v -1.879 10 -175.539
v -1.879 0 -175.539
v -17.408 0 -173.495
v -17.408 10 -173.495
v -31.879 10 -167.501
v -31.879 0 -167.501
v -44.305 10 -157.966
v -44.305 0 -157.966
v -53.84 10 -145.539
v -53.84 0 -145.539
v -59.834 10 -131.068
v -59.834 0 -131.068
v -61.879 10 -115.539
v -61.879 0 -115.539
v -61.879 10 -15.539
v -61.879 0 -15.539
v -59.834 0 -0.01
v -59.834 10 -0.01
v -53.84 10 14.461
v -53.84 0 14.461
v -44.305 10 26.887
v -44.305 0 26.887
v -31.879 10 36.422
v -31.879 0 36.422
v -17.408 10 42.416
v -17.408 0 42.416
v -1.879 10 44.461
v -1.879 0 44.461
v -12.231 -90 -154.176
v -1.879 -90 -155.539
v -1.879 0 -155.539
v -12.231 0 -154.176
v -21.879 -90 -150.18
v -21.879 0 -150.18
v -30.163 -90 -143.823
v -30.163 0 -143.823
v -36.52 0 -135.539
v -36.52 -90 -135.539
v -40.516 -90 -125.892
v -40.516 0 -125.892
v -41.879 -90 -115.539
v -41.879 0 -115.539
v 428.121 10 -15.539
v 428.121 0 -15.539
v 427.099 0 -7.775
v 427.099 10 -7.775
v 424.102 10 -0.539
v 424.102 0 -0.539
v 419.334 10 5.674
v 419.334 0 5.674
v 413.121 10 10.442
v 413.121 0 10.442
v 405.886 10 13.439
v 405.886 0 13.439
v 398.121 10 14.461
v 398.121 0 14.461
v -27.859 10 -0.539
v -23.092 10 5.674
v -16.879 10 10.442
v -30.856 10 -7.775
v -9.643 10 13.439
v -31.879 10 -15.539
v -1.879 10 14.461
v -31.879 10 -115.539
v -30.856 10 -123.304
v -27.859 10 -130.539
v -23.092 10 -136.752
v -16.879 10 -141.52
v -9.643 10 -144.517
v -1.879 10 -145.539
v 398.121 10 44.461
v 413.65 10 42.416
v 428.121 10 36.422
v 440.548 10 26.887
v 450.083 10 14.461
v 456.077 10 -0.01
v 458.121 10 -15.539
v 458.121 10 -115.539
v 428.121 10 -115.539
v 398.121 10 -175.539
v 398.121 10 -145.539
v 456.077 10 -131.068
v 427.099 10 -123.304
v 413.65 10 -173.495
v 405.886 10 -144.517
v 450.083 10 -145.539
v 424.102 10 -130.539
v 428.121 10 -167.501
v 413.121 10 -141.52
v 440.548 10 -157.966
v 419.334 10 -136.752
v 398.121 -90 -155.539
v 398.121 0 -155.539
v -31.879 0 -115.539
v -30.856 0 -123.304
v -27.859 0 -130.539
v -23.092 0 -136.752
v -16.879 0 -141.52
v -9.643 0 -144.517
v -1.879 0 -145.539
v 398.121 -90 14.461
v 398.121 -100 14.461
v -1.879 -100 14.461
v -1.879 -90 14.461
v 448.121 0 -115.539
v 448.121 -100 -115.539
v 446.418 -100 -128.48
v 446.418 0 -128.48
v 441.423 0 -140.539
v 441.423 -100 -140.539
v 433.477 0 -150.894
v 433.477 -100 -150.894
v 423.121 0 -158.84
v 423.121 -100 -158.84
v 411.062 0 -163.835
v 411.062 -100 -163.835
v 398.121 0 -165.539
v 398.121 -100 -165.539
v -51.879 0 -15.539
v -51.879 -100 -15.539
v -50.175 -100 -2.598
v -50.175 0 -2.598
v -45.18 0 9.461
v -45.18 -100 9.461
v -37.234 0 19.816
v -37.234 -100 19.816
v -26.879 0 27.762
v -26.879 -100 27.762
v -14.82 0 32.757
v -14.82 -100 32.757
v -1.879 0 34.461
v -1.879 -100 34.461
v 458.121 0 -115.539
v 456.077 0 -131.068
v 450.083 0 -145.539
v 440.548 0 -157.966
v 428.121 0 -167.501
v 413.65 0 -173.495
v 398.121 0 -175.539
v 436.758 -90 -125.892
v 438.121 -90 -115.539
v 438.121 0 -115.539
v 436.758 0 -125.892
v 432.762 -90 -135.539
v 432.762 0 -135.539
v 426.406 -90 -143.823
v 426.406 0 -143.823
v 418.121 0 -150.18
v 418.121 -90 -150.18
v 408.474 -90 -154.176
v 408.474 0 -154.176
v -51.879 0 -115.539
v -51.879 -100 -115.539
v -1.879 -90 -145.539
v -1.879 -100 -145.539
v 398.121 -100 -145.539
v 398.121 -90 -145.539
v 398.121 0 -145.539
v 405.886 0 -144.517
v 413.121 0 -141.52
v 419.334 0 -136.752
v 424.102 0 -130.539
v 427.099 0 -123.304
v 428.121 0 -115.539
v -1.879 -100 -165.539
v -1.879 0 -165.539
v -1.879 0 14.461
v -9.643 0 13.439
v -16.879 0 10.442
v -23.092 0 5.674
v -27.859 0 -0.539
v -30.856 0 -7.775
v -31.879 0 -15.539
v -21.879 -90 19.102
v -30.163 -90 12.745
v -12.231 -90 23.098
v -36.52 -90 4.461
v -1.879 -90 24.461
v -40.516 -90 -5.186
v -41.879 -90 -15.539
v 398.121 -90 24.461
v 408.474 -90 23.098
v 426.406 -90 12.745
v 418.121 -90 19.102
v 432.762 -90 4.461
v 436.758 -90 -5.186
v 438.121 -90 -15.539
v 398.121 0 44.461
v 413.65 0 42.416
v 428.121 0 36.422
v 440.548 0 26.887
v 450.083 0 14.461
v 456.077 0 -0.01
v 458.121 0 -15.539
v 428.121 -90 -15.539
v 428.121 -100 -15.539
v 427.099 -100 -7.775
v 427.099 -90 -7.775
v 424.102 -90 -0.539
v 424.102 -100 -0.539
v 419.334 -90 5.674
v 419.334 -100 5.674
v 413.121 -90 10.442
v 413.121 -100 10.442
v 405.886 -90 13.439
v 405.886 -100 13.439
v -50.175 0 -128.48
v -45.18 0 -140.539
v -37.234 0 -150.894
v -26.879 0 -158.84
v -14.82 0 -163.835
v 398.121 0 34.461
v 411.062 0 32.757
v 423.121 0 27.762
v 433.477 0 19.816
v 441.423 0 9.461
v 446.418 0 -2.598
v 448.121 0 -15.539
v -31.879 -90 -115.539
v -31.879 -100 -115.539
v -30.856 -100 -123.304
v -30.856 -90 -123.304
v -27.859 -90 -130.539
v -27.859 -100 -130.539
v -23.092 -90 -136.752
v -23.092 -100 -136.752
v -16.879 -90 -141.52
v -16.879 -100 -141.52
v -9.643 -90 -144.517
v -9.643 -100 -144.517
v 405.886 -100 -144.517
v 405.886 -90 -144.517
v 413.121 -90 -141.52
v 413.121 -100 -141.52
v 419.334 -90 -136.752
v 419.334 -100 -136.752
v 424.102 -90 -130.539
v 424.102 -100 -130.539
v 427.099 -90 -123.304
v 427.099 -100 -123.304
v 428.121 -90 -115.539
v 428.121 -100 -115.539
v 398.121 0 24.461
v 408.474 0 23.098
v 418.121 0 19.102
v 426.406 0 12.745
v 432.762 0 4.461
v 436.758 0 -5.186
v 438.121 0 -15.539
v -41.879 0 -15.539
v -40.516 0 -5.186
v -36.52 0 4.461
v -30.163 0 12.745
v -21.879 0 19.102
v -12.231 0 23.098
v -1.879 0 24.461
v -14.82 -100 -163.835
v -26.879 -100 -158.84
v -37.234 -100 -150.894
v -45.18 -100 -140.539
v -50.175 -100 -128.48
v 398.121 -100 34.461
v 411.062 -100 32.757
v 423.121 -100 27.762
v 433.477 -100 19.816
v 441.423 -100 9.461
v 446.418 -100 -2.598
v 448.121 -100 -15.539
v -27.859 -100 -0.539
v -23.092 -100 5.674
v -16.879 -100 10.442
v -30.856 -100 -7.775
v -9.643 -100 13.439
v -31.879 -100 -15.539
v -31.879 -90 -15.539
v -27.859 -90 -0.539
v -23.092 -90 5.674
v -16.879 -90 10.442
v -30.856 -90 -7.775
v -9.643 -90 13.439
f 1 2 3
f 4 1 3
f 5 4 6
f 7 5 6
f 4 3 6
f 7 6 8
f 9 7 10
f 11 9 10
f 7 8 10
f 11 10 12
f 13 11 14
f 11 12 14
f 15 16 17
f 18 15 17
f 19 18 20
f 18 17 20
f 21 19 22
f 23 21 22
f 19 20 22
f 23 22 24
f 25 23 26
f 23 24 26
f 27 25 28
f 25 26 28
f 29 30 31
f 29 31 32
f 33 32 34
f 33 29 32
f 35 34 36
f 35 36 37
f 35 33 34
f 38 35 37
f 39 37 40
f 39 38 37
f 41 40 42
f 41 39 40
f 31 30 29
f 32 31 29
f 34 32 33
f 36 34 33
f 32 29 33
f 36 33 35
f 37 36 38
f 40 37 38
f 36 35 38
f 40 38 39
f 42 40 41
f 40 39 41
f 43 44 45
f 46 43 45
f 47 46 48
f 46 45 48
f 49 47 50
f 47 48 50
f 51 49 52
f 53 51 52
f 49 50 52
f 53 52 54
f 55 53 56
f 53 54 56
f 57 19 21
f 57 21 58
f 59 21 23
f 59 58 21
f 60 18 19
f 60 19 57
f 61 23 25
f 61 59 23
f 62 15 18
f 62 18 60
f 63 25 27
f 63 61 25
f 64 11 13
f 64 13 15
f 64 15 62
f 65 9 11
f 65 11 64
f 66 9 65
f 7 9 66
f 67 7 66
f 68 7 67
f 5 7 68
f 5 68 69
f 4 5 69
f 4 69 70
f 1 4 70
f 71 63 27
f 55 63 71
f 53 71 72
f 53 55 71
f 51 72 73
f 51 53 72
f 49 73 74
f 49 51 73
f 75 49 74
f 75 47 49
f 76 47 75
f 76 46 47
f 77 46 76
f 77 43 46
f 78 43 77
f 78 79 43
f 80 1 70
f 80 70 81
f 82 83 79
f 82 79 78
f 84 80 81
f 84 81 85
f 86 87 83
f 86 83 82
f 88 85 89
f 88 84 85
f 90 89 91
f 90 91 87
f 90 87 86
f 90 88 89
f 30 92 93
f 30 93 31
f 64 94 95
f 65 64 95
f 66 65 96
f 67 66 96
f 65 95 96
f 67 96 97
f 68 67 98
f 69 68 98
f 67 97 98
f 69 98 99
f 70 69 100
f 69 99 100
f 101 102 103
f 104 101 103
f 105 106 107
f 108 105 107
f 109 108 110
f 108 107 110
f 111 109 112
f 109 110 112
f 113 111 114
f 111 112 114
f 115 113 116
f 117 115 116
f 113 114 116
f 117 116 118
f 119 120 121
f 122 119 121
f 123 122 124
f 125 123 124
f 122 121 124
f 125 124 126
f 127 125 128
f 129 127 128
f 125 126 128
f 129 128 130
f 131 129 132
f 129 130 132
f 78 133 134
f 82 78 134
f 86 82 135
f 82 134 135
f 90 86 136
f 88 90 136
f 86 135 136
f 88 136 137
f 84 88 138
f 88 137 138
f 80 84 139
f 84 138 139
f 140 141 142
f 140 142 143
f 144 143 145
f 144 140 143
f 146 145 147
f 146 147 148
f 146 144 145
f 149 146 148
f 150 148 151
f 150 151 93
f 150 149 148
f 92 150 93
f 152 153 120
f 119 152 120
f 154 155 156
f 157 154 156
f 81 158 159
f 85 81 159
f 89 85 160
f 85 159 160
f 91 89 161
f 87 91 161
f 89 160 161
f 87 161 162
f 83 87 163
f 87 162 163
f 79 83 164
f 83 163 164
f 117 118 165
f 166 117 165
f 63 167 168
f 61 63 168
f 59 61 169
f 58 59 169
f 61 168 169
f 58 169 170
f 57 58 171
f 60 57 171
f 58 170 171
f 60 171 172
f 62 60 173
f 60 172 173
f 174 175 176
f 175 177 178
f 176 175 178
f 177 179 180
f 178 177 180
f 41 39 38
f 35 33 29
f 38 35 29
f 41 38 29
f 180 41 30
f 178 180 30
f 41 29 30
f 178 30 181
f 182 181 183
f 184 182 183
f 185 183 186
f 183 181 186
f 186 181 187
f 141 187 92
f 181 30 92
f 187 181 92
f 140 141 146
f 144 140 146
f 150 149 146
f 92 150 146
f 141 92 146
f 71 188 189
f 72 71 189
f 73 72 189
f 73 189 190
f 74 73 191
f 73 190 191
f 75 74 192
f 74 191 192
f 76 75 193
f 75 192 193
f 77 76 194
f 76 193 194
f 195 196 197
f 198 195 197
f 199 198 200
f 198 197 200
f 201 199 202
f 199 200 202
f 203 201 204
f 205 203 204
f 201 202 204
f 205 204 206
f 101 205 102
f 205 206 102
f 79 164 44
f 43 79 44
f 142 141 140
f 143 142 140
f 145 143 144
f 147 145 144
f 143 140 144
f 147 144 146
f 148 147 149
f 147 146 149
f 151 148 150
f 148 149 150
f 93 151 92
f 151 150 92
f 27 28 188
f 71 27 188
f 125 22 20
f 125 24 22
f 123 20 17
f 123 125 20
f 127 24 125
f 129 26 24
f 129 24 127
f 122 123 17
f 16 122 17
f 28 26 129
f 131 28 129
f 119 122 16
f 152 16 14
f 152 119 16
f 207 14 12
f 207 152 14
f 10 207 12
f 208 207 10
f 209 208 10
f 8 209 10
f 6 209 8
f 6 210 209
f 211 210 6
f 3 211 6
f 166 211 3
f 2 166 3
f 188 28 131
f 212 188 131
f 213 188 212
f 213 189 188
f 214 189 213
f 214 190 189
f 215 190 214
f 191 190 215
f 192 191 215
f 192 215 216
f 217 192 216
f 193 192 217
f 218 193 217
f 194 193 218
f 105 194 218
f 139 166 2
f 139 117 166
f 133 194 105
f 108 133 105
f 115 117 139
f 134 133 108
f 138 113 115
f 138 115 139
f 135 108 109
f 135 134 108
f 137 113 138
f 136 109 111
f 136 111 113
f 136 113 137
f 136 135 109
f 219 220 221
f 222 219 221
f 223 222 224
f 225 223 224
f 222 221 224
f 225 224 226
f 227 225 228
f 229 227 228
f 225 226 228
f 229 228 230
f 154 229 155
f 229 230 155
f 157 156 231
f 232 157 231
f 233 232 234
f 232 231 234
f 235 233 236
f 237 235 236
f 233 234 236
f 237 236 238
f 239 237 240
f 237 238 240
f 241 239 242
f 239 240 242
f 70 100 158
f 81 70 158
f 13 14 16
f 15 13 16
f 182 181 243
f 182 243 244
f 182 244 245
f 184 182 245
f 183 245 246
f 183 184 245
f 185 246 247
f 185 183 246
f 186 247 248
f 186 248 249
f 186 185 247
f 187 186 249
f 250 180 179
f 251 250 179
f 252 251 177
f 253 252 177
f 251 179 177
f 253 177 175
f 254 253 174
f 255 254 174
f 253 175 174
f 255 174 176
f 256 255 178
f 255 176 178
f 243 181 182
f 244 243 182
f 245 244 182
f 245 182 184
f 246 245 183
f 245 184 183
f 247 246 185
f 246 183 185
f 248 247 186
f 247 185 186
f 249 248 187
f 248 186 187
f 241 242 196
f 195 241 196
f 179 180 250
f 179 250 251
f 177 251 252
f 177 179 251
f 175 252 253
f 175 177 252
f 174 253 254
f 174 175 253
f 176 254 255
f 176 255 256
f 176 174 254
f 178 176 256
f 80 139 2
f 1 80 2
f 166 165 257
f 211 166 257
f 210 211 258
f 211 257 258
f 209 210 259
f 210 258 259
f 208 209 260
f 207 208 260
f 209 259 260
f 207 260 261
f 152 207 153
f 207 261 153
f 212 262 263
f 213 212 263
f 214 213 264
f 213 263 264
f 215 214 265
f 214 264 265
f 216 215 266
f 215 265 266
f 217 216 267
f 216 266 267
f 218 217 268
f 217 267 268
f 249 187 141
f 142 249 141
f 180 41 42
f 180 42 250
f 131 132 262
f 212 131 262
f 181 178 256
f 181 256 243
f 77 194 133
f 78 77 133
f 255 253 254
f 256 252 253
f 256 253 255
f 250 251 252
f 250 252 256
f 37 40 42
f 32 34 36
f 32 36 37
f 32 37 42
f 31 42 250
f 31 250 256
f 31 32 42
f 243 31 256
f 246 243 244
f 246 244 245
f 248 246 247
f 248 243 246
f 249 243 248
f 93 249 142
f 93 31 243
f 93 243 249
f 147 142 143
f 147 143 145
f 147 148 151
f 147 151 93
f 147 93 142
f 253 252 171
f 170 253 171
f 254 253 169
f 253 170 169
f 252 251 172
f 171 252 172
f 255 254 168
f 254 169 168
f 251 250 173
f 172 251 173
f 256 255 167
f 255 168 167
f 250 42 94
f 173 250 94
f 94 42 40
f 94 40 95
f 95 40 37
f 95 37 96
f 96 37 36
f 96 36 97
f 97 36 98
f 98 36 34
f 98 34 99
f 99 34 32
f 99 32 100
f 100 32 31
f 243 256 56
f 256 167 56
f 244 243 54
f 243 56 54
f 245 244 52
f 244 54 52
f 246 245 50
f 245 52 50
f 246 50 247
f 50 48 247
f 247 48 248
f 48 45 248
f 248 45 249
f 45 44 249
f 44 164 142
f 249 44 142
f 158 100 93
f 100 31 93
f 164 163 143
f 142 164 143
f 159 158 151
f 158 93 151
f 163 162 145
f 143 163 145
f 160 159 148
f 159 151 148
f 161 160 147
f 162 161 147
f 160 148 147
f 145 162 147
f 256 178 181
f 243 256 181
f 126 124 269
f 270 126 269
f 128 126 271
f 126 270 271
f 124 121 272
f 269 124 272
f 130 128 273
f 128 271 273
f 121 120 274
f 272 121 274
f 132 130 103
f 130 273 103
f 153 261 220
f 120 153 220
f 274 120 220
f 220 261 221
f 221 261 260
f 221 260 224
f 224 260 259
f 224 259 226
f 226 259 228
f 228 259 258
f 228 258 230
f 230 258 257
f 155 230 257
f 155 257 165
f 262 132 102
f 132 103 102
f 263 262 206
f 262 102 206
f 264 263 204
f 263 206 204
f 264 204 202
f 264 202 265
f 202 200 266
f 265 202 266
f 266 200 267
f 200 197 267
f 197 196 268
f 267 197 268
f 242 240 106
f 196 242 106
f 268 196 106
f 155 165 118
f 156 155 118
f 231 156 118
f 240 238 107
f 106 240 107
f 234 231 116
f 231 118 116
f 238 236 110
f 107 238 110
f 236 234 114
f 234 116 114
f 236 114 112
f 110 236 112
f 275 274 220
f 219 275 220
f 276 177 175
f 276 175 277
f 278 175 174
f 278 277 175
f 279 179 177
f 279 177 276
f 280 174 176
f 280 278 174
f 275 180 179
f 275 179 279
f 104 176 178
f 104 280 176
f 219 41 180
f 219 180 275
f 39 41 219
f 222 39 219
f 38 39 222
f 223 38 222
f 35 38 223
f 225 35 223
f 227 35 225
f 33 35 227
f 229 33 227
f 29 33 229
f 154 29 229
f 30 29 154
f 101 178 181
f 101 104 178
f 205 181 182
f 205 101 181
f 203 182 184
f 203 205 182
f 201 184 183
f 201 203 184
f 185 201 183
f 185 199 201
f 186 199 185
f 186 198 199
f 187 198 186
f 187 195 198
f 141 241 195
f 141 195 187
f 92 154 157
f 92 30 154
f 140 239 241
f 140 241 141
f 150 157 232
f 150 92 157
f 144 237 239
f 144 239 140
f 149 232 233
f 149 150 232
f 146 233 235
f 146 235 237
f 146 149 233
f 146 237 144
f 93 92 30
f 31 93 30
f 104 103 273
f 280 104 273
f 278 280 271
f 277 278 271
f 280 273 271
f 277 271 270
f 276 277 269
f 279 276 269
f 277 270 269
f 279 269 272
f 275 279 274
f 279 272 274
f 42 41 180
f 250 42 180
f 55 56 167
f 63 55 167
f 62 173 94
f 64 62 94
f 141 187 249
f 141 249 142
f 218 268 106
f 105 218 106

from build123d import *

# Parameters (mm, degrees)
SURFACE_EXTRUDE1_1_BACK  = 100
SURFACE_EXTRUDE1_1_DEPTH = 100
THICKEN1_T1              = 10
SURFACE_EXTRUDE2_2_DEPTH = 10
THICKEN2_T1              = 10
THICKEN2_T2              = 10
THICKEN3_START           = -100
THICKEN3_DEPTH           = 10
THICKEN4_DEPTH           = 10
THICKEN5_START           = -90
THICKEN5_DEPTH           = 90


# Read off the part's stored shape, not the designer's step: Thicken3, Thicken4, Thicken5
with BuildPart() as body_1:
    # Surface-Extrude1: a surface, the sketch's curves swept straight by 100 mm
    with BuildLine(Plane(origin=(0, 0, 0), x_dir=(1, 0, 0), z_dir=(0, 1, 0)).offset(-SURFACE_EXTRUDE1_1_BACK), mode=Mode.PRIVATE) as surface_extrude1_1_path:
        Line((-1.878720563, -34.460865773), (398.121279437, -34.460865773))
        ThreePointArc((398.121279437, -34.460865773), (433.476618497, -19.816204833), (448.121279437, 15.539134227))
        Line((448.121279437, 15.539134227), (448.121279437, 115.539134227))
        ThreePointArc((448.121279437, 115.539134227), (433.476618497, 150.894473286), (398.121279437, 165.539134227))
        Line((398.121279437, 165.539134227), (-1.878720563, 165.539134227))
        ThreePointArc((-1.878720563, 165.539134227), (-37.234059622, 150.894473286), (-51.878720563, 115.539134227))
        Line((-51.878720563, 115.539134227), (-51.878720563, 15.539134227))
        ThreePointArc((-51.878720563, 15.539134227), (-37.234059622, -19.816204833), (-1.878720563, -34.460865773))
    surface_extrude1_1 = Shell.extrude(surface_extrude1_1_path.wire(), (0 * SURFACE_EXTRUDE1_1_DEPTH, 1 * SURFACE_EXTRUDE1_1_DEPTH, 0 * SURFACE_EXTRUDE1_1_DEPTH))
    add(Solid.thicken(surface_extrude1_1, THICKEN1_T1))

    # Surface-Extrude2: a surface, the sketch's curves swept straight by 10 mm
    with BuildLine(Plane(origin=(0, 0, 0), x_dir=(1, 0, 0), z_dir=(0, 1, 0)), mode=Mode.PRIVATE) as surface_extrude2_2_path:
        Line((-1.878720563, -34.460865773), (398.121279437, -34.460865773))
        ThreePointArc((398.121279437, -34.460865773), (433.476618497, -19.816204833), (448.121279437, 15.539134227))
        Line((448.121279437, 15.539134227), (448.121279437, 115.539134227))
        ThreePointArc((448.121279437, 115.539134227), (433.476618497, 150.894473286), (398.121279437, 165.539134227))
        Line((398.121279437, 165.539134227), (-1.878720563, 165.539134227))
        ThreePointArc((-1.878720563, 165.539134227), (-37.234059622, 150.894473286), (-51.878720563, 115.539134227))
        Line((-51.878720563, 115.539134227), (-51.878720563, 15.539134227))
        ThreePointArc((-51.878720563, 15.539134227), (-37.234059622, -19.816204833), (-1.878720563, -34.460865773))
    surface_extrude2_2 = Shell.extrude(surface_extrude2_2_path.wire(), (0 * SURFACE_EXTRUDE2_2_DEPTH, 1 * SURFACE_EXTRUDE2_2_DEPTH, 0 * SURFACE_EXTRUDE2_2_DEPTH))
    add(Solid.thicken(surface_extrude2_2, THICKEN2_T1))
    add(Solid.thicken(surface_extrude2_2, -THICKEN2_T2))

    # Thicken3 outline → Thicken3 (add)
    with BuildSketch(Plane(origin=(0, 0, 0), x_dir=(1, 0, 0), z_dir=(0, 1, 0)).offset(THICKEN3_START)):
        with BuildLine():
            ThreePointArc((398.121279437, -24.460865773), (426.405550685, -12.745137021), (438.121279437, 15.539134227))
            Line((438.121279437, 15.539134227), (438.121279437, 115.539134227))
            ThreePointArc((438.121279437, 115.539134227), (426.405550684, 143.823405474), (398.121279437, 155.539134227))
            Line((398.121279437, 155.539134227), (-1.878720563, 155.539134227))
            ThreePointArc((-1.878720563, 155.539134227), (-30.16299181, 143.823405474), (-41.878720563, 115.539134227))
            Line((-41.878720563, 115.539134227), (-41.878720563, 15.539134227))
            ThreePointArc((-41.878720563, 15.539134227), (-30.16299181, -12.745137021), (-1.878720563, -24.460865773))
            Line((-1.878720563, -24.460865773), (398.121279437, -24.460865773))
        make_face()
        with BuildLine():
            ThreePointArc((398.121279437, 145.539134227), (419.334482873, 136.752337662), (428.121279437, 115.539134227))
            Line((428.121279437, 115.539134227), (428.121279437, 15.539134227))
            ThreePointArc((428.121279437, 15.539134227), (419.334482873, -5.674069209), (398.121279437, -14.460865773))
            Line((398.121279437, -14.460865773), (-1.878720563, -14.460865773))
            ThreePointArc((-1.878720563, -14.460865773), (-23.091923998, -5.674069208), (-31.878720563, 15.539134227))
            Line((-31.878720563, 15.539134227), (-31.878720563, 115.539134227))
            ThreePointArc((-31.878720563, 115.539134227), (-23.091923998, 136.752337662), (-1.878720563, 145.539134227))
            Line((-1.878720563, 145.539134227), (398.121279437, 145.539134227))
        make_face(mode=Mode.SUBTRACT)
    extrude(amount=THICKEN3_DEPTH)

    # Thicken4 outline → Thicken4 (add)
    with BuildSketch(Plane(origin=(0, 0, 0), x_dir=(1, 0, 0), z_dir=(0, 1, 0))):
        with BuildLine():
            ThreePointArc((398.121279437, -24.460865773), (426.405550685, -12.745137021), (438.121279437, 15.539134227))
            Line((438.121279437, 15.539134227), (438.121279437, 115.539134227))
            ThreePointArc((438.121279437, 115.539134227), (426.405550684, 143.823405474), (398.121279437, 155.539134227))
            Line((398.121279437, 155.539134227), (-1.878720563, 155.539134227))
            ThreePointArc((-1.878720563, 155.539134227), (-30.16299181, 143.823405474), (-41.878720563, 115.539134227))
            Line((-41.878720563, 115.539134227), (-41.878720563, 15.539134227))
            ThreePointArc((-41.878720563, 15.539134227), (-30.16299181, -12.745137021), (-1.878720563, -24.460865773))
            Line((-1.878720563, -24.460865773), (398.121279437, -24.460865773))
        make_face()
        with BuildLine():
            Line((-1.878720563, 145.539134227), (398.121279437, 145.539134227))
            ThreePointArc((398.121279437, 145.539134227), (419.334482873, 136.752337662), (428.121279437, 115.539134227))
            Line((428.121279437, 115.539134227), (428.121279437, 15.539134227))
            ThreePointArc((428.121279437, 15.539134227), (419.334482873, -5.674069209), (398.121279437, -14.460865773))
            Line((398.121279437, -14.460865773), (-1.878720563, -14.460865773))
            ThreePointArc((-1.878720563, -14.460865773), (-23.091923998, -5.674069208), (-31.878720563, 15.539134227))
            Line((-31.878720563, 15.539134227), (-31.878720563, 115.539134227))
            ThreePointArc((-31.878720563, 115.539134227), (-23.091923998, 136.752337662), (-1.878720563, 145.539134227))
        make_face(mode=Mode.SUBTRACT)
    extrude(amount=THICKEN4_DEPTH)


with BuildPart() as body_2:
    # Thicken5 outline → Thicken5 (new body)
    with BuildSketch(Plane(origin=(0, 0, 0), x_dir=(1, 0, 0), z_dir=(0, 1, 0)).offset(THICKEN5_START)):
        with BuildLine():
            ThreePointArc((-1.878720563, 155.539134227), (-30.16299181, 143.823405474), (-41.878720563, 115.539134227))
            Line((-41.878720563, 115.539134227), (-41.878720563, 15.539134227))
            ThreePointArc((-41.878720563, 15.539134227), (-30.16299181, -12.745137021), (-1.878720563, -24.460865773))
            Line((-1.878720563, -24.460865773), (398.121279437, -24.460865773))
            ThreePointArc((398.121279437, -24.460865773), (426.405550685, -12.745137021), (438.121279437, 15.539134227))
            Line((438.121279437, 15.539134227), (438.121279437, 115.539134227))
            ThreePointArc((438.121279437, 115.539134227), (426.405550684, 143.823405474), (398.121279437, 155.539134227))
            Line((398.121279437, 155.539134227), (-1.878720563, 155.539134227))
        make_face()
    extrude(amount=THICKEN5_DEPTH)


solid = Compound([body_1.part, body_2.part])
